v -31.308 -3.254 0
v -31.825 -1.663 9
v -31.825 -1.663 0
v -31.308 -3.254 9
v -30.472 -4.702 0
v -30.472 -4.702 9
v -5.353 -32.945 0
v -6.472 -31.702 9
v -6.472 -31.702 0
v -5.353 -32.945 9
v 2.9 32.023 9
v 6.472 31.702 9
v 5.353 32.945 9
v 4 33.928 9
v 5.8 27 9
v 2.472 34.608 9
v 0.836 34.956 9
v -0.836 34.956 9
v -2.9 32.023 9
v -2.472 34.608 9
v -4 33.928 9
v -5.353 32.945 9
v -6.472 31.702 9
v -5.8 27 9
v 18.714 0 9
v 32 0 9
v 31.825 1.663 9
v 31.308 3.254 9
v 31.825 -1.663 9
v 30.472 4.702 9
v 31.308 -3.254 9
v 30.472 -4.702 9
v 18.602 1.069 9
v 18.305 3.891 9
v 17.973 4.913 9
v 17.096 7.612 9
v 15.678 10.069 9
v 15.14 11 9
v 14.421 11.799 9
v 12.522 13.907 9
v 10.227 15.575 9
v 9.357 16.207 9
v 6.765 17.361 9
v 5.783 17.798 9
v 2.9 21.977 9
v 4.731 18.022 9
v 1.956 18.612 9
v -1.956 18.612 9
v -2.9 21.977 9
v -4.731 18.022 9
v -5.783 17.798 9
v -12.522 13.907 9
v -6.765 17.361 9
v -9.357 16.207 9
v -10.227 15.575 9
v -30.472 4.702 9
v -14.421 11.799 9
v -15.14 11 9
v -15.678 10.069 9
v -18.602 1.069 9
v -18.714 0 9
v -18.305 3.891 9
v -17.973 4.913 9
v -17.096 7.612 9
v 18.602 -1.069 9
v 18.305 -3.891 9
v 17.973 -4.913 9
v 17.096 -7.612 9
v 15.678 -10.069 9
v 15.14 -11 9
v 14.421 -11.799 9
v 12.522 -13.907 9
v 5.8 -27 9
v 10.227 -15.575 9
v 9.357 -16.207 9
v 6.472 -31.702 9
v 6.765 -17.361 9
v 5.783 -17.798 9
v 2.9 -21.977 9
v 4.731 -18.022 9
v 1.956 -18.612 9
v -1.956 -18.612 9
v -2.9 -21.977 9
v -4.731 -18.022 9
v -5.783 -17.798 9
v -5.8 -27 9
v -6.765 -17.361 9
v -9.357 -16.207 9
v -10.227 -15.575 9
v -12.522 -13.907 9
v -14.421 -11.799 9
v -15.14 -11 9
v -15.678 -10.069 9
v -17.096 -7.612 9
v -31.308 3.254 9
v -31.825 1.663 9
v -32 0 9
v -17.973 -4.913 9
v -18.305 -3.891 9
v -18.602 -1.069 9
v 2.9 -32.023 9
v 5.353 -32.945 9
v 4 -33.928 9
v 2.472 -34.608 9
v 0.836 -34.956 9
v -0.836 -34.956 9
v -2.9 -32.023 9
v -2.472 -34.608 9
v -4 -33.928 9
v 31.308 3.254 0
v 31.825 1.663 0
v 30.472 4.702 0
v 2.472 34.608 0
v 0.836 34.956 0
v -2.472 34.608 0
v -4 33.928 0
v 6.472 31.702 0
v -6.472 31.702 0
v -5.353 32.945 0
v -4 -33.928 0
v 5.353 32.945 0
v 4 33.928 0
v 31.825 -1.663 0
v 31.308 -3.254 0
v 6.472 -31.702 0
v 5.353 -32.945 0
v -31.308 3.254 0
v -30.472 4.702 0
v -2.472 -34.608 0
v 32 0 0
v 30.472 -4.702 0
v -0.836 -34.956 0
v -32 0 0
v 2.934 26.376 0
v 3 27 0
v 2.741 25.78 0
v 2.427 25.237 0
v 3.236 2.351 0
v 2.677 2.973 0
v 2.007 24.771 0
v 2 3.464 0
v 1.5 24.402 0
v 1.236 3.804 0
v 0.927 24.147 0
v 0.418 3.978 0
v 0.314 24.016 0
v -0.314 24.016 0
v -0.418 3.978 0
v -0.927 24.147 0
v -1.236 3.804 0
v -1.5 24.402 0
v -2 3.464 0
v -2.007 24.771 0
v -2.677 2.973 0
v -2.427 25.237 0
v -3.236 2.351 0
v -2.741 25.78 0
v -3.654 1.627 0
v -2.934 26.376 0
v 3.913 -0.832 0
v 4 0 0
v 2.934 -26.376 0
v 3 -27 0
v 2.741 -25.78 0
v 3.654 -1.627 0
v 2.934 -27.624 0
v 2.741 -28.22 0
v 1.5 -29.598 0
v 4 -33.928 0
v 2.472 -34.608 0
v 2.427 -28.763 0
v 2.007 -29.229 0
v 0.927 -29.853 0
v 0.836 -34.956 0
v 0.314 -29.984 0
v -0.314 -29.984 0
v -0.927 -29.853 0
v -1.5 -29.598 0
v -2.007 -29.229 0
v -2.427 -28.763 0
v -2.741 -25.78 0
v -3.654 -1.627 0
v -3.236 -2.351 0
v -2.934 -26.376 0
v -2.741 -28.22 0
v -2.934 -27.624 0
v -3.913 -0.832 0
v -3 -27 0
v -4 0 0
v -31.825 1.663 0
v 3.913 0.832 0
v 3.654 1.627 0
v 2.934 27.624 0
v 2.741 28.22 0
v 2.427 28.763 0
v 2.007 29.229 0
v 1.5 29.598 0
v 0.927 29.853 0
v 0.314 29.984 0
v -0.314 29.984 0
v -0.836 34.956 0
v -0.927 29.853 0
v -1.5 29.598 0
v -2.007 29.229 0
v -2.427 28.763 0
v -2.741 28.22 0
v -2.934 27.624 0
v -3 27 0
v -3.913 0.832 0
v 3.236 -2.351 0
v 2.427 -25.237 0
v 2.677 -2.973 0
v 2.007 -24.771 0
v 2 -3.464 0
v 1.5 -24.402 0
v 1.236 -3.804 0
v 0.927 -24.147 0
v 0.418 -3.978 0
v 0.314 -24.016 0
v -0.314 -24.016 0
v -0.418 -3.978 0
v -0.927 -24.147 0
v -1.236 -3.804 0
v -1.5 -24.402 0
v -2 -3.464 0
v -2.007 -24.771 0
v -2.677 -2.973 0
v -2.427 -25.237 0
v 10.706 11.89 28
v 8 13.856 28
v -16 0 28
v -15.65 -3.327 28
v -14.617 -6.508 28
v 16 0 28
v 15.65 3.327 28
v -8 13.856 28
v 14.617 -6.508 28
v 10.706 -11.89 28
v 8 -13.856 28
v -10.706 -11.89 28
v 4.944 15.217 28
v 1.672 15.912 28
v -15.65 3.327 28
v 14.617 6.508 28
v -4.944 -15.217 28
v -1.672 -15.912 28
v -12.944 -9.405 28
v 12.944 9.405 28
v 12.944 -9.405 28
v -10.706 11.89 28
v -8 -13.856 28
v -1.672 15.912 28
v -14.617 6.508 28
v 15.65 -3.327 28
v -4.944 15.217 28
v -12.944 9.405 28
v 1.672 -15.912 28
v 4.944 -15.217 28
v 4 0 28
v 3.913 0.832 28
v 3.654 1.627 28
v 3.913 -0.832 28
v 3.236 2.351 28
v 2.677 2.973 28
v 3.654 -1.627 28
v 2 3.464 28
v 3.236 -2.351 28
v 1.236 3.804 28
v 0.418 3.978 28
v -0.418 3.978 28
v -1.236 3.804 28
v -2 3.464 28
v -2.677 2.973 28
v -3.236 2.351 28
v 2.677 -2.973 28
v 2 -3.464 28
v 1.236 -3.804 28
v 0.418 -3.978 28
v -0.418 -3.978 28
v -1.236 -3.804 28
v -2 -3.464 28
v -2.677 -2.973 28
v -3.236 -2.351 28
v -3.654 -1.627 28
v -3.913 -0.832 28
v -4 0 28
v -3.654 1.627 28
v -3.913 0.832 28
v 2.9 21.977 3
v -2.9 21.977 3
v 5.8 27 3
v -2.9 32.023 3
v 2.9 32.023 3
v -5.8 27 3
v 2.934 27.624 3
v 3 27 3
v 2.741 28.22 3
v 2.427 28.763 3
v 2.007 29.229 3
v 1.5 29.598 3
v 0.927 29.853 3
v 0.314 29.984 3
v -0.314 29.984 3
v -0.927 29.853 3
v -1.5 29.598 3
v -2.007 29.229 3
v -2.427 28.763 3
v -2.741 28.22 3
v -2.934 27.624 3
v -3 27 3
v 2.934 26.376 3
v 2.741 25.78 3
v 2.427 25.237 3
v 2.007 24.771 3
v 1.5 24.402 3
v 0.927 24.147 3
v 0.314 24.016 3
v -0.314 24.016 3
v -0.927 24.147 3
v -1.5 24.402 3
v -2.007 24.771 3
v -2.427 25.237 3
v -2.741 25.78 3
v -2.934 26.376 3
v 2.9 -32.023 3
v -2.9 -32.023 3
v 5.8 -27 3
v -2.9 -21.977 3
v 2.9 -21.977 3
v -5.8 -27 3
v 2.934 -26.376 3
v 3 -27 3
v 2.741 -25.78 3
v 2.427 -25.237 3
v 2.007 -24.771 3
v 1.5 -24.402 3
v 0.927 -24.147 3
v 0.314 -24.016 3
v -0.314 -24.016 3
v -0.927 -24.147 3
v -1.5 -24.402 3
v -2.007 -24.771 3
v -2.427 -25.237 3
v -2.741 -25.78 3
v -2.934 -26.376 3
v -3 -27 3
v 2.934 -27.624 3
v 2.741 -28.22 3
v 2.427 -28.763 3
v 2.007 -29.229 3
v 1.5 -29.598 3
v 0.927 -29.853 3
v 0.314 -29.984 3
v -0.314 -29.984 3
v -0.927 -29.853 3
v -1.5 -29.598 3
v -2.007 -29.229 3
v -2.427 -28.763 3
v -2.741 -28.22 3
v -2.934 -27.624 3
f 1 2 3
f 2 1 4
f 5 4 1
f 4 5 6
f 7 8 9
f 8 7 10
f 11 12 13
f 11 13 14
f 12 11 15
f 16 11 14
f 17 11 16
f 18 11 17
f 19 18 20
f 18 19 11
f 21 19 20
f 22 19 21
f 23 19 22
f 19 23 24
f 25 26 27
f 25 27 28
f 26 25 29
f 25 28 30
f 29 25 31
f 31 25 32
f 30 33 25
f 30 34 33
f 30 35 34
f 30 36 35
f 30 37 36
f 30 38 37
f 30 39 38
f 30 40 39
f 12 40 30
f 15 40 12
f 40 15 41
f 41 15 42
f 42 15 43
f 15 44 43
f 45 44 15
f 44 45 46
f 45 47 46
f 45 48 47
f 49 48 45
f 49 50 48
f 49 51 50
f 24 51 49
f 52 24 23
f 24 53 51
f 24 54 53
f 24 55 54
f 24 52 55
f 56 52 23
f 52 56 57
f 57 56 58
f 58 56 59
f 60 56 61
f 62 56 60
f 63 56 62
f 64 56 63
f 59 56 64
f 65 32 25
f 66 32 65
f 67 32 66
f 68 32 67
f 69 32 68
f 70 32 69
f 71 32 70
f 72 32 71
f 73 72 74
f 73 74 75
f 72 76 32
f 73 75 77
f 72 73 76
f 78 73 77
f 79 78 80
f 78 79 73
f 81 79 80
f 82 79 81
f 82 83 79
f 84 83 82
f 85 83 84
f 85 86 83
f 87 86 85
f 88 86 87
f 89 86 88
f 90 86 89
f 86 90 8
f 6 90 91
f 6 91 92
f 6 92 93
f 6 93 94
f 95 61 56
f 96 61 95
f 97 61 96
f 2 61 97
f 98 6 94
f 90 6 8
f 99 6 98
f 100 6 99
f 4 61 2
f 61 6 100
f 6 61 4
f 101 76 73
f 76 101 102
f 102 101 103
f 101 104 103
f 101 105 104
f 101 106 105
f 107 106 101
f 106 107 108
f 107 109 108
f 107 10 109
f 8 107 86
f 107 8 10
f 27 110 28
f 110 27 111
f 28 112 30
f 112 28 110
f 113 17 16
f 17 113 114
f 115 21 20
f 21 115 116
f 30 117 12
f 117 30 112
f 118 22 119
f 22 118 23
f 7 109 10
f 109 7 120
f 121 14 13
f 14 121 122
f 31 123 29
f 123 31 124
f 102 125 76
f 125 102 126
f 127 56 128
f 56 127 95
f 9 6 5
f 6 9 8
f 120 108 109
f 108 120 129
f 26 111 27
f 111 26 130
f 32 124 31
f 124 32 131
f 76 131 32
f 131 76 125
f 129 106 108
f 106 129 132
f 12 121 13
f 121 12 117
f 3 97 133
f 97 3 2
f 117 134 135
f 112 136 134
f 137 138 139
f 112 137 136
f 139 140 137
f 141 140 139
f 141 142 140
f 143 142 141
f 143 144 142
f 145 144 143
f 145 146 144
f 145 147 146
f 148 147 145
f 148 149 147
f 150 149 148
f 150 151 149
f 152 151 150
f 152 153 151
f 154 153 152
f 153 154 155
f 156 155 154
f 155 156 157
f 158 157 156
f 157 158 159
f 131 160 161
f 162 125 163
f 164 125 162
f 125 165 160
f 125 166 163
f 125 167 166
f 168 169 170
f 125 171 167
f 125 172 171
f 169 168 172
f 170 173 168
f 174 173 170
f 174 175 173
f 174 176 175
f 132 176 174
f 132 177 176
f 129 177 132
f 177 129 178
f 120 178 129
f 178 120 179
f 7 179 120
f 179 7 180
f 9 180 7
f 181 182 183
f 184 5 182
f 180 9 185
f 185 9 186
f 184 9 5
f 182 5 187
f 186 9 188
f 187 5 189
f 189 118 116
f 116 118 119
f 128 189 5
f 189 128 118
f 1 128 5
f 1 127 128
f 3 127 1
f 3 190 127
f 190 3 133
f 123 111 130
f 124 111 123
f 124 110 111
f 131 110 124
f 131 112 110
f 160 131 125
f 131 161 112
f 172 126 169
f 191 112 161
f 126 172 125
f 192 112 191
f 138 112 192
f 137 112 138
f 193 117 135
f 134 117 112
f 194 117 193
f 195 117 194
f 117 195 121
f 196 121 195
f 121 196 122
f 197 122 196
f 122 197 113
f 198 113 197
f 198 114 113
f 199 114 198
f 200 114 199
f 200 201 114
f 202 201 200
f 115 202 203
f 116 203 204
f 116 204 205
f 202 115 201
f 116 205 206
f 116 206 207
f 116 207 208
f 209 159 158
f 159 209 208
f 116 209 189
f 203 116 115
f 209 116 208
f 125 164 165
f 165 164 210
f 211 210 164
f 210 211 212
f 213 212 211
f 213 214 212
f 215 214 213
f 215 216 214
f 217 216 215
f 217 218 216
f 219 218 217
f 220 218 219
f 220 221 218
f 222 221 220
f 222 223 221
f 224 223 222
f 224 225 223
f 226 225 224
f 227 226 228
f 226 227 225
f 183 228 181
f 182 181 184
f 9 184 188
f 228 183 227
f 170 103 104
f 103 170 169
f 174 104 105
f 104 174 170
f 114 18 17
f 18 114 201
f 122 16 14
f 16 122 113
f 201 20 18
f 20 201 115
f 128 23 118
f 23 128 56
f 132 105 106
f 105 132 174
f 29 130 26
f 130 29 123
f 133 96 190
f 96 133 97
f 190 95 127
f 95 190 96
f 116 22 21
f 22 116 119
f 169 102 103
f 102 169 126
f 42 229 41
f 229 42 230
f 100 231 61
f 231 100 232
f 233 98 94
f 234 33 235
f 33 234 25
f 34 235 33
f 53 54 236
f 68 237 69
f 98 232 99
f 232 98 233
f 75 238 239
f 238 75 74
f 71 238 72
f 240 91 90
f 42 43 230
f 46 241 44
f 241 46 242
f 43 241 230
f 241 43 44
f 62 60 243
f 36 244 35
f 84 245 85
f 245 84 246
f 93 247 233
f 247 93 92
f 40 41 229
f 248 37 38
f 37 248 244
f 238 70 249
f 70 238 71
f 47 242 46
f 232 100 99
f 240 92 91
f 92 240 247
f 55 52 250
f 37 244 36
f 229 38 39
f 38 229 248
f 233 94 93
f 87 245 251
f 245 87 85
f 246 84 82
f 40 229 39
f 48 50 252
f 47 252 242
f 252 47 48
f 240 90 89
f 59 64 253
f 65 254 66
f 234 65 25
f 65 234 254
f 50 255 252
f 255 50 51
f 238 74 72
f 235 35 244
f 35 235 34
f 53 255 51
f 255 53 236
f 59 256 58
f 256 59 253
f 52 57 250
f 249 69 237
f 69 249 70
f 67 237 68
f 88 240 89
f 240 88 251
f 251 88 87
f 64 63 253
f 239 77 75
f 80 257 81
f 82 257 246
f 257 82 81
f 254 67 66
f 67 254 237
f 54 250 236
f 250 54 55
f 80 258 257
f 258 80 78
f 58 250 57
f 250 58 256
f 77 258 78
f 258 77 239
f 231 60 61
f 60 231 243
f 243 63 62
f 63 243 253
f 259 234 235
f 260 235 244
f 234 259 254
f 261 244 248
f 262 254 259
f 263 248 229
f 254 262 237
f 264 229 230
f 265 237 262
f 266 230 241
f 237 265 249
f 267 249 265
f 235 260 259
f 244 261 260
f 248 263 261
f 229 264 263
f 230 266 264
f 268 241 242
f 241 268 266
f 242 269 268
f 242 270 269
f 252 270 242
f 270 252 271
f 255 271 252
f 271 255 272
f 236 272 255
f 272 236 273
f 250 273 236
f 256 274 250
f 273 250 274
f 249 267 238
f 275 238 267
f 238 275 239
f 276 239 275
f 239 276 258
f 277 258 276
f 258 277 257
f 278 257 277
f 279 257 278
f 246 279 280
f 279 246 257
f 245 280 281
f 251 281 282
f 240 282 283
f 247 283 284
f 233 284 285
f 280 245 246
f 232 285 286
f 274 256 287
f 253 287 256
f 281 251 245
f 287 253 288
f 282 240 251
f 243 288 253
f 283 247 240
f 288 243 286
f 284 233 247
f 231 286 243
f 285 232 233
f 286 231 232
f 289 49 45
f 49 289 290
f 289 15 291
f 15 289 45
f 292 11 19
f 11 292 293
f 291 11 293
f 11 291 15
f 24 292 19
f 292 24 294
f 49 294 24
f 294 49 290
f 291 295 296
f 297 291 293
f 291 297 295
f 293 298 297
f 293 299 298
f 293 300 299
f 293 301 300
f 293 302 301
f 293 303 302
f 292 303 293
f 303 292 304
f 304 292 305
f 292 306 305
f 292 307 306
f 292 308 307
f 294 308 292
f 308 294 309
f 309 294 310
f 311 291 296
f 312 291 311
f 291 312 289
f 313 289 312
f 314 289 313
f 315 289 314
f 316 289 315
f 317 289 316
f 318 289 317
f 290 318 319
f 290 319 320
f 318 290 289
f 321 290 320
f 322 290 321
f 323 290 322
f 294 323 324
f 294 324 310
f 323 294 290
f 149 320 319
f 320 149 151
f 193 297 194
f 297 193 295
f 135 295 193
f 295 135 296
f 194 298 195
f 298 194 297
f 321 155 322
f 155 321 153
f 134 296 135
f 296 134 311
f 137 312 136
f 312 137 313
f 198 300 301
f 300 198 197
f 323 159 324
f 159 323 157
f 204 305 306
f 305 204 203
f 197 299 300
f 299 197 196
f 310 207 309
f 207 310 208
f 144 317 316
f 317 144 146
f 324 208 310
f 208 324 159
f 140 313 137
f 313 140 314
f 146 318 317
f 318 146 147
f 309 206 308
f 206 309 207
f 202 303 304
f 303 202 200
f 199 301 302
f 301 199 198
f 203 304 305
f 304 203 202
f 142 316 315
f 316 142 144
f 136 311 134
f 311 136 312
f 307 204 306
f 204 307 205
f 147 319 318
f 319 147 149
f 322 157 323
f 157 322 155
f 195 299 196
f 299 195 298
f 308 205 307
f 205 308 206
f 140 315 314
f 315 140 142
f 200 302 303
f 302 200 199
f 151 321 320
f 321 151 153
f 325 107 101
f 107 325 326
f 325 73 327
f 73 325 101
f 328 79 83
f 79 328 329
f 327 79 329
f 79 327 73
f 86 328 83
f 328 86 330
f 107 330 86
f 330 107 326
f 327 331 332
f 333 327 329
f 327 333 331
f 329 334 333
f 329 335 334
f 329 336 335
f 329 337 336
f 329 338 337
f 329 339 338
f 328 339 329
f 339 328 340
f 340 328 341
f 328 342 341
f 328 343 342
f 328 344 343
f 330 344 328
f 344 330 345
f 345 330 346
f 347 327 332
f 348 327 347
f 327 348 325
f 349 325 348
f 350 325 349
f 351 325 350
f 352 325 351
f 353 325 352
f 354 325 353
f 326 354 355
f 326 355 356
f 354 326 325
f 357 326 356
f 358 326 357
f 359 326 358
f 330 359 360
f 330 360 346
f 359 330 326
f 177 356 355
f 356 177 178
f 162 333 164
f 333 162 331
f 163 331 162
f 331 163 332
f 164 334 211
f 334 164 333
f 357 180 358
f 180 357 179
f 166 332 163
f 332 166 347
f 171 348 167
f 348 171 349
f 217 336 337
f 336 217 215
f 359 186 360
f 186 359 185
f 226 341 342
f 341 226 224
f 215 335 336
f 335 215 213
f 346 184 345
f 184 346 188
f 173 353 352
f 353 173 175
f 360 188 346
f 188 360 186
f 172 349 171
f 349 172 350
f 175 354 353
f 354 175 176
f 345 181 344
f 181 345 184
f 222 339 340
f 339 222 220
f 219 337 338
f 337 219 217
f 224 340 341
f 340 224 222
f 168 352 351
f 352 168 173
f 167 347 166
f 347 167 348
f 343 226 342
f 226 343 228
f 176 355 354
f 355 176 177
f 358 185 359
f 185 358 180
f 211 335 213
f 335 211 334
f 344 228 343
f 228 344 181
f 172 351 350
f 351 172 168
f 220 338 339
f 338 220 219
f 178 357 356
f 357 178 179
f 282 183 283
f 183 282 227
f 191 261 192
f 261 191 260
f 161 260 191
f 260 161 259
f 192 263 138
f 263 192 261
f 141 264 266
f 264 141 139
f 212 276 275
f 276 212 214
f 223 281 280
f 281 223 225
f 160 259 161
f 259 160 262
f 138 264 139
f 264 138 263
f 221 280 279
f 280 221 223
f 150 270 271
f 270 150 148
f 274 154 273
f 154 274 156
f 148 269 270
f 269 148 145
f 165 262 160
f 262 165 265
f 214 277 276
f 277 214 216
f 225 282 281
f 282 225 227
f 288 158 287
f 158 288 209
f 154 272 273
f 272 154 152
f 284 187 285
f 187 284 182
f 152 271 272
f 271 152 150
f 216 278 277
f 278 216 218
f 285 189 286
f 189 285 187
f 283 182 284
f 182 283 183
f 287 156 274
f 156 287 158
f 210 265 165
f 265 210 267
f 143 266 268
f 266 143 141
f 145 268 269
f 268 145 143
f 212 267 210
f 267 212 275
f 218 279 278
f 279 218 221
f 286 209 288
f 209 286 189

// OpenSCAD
$fn = 30;

HEIGHT = 28;

THICKNESS = 9;
HOLE_DIAMETER = 6;

FLAG_TUBE_DIAMETER = 8;
FLAG_TUBE_BORDER = 12;

module nut() {
    nut_diameter = 11.2;
    nut_clear = 0.2;
    nut_height = 4.6 + 1.5;
    cylinder(r = nut_diameter / 2 + nut_clear, h = nut_height, $fn = 6);
}

module support() {
    module corners(all = true) {
        for (pos = [
            [0, 27, 0],
            [0, -27, 0]
            ]) {
            translate(pos) {
                children([0 : $children - 1]);
            }
        }

        if (all) {
            for (pos = [
                [24, 0, 0],
                [-24, 0, 0],
                ]) {
                translate(pos) {
                    children([0 : $children - 1]);
                }
            }
        }
    }

    difference() {
        union() {
            hull() {
                corners() {
                    cylinder(r = 8, h = THICKNESS);
                }
            }

            cylinder(r1 = FLAG_TUBE_DIAMETER / 2 + FLAG_TUBE_BORDER + 4, r2 = FLAG_TUBE_DIAMETER / 2 + FLAG_TUBE_BORDER, h = HEIGHT);
        }

        translate([0, 0, -10]) {
            cylinder(r = FLAG_TUBE_DIAMETER / 2, h = 100);
        }

        corners(false) {
            translate([0, 0, 3]) {
                nut();
            }
            cylinder(r = HOLE_DIAMETER / 2, h = 15, center = true);
        }
    }
}

!support();
